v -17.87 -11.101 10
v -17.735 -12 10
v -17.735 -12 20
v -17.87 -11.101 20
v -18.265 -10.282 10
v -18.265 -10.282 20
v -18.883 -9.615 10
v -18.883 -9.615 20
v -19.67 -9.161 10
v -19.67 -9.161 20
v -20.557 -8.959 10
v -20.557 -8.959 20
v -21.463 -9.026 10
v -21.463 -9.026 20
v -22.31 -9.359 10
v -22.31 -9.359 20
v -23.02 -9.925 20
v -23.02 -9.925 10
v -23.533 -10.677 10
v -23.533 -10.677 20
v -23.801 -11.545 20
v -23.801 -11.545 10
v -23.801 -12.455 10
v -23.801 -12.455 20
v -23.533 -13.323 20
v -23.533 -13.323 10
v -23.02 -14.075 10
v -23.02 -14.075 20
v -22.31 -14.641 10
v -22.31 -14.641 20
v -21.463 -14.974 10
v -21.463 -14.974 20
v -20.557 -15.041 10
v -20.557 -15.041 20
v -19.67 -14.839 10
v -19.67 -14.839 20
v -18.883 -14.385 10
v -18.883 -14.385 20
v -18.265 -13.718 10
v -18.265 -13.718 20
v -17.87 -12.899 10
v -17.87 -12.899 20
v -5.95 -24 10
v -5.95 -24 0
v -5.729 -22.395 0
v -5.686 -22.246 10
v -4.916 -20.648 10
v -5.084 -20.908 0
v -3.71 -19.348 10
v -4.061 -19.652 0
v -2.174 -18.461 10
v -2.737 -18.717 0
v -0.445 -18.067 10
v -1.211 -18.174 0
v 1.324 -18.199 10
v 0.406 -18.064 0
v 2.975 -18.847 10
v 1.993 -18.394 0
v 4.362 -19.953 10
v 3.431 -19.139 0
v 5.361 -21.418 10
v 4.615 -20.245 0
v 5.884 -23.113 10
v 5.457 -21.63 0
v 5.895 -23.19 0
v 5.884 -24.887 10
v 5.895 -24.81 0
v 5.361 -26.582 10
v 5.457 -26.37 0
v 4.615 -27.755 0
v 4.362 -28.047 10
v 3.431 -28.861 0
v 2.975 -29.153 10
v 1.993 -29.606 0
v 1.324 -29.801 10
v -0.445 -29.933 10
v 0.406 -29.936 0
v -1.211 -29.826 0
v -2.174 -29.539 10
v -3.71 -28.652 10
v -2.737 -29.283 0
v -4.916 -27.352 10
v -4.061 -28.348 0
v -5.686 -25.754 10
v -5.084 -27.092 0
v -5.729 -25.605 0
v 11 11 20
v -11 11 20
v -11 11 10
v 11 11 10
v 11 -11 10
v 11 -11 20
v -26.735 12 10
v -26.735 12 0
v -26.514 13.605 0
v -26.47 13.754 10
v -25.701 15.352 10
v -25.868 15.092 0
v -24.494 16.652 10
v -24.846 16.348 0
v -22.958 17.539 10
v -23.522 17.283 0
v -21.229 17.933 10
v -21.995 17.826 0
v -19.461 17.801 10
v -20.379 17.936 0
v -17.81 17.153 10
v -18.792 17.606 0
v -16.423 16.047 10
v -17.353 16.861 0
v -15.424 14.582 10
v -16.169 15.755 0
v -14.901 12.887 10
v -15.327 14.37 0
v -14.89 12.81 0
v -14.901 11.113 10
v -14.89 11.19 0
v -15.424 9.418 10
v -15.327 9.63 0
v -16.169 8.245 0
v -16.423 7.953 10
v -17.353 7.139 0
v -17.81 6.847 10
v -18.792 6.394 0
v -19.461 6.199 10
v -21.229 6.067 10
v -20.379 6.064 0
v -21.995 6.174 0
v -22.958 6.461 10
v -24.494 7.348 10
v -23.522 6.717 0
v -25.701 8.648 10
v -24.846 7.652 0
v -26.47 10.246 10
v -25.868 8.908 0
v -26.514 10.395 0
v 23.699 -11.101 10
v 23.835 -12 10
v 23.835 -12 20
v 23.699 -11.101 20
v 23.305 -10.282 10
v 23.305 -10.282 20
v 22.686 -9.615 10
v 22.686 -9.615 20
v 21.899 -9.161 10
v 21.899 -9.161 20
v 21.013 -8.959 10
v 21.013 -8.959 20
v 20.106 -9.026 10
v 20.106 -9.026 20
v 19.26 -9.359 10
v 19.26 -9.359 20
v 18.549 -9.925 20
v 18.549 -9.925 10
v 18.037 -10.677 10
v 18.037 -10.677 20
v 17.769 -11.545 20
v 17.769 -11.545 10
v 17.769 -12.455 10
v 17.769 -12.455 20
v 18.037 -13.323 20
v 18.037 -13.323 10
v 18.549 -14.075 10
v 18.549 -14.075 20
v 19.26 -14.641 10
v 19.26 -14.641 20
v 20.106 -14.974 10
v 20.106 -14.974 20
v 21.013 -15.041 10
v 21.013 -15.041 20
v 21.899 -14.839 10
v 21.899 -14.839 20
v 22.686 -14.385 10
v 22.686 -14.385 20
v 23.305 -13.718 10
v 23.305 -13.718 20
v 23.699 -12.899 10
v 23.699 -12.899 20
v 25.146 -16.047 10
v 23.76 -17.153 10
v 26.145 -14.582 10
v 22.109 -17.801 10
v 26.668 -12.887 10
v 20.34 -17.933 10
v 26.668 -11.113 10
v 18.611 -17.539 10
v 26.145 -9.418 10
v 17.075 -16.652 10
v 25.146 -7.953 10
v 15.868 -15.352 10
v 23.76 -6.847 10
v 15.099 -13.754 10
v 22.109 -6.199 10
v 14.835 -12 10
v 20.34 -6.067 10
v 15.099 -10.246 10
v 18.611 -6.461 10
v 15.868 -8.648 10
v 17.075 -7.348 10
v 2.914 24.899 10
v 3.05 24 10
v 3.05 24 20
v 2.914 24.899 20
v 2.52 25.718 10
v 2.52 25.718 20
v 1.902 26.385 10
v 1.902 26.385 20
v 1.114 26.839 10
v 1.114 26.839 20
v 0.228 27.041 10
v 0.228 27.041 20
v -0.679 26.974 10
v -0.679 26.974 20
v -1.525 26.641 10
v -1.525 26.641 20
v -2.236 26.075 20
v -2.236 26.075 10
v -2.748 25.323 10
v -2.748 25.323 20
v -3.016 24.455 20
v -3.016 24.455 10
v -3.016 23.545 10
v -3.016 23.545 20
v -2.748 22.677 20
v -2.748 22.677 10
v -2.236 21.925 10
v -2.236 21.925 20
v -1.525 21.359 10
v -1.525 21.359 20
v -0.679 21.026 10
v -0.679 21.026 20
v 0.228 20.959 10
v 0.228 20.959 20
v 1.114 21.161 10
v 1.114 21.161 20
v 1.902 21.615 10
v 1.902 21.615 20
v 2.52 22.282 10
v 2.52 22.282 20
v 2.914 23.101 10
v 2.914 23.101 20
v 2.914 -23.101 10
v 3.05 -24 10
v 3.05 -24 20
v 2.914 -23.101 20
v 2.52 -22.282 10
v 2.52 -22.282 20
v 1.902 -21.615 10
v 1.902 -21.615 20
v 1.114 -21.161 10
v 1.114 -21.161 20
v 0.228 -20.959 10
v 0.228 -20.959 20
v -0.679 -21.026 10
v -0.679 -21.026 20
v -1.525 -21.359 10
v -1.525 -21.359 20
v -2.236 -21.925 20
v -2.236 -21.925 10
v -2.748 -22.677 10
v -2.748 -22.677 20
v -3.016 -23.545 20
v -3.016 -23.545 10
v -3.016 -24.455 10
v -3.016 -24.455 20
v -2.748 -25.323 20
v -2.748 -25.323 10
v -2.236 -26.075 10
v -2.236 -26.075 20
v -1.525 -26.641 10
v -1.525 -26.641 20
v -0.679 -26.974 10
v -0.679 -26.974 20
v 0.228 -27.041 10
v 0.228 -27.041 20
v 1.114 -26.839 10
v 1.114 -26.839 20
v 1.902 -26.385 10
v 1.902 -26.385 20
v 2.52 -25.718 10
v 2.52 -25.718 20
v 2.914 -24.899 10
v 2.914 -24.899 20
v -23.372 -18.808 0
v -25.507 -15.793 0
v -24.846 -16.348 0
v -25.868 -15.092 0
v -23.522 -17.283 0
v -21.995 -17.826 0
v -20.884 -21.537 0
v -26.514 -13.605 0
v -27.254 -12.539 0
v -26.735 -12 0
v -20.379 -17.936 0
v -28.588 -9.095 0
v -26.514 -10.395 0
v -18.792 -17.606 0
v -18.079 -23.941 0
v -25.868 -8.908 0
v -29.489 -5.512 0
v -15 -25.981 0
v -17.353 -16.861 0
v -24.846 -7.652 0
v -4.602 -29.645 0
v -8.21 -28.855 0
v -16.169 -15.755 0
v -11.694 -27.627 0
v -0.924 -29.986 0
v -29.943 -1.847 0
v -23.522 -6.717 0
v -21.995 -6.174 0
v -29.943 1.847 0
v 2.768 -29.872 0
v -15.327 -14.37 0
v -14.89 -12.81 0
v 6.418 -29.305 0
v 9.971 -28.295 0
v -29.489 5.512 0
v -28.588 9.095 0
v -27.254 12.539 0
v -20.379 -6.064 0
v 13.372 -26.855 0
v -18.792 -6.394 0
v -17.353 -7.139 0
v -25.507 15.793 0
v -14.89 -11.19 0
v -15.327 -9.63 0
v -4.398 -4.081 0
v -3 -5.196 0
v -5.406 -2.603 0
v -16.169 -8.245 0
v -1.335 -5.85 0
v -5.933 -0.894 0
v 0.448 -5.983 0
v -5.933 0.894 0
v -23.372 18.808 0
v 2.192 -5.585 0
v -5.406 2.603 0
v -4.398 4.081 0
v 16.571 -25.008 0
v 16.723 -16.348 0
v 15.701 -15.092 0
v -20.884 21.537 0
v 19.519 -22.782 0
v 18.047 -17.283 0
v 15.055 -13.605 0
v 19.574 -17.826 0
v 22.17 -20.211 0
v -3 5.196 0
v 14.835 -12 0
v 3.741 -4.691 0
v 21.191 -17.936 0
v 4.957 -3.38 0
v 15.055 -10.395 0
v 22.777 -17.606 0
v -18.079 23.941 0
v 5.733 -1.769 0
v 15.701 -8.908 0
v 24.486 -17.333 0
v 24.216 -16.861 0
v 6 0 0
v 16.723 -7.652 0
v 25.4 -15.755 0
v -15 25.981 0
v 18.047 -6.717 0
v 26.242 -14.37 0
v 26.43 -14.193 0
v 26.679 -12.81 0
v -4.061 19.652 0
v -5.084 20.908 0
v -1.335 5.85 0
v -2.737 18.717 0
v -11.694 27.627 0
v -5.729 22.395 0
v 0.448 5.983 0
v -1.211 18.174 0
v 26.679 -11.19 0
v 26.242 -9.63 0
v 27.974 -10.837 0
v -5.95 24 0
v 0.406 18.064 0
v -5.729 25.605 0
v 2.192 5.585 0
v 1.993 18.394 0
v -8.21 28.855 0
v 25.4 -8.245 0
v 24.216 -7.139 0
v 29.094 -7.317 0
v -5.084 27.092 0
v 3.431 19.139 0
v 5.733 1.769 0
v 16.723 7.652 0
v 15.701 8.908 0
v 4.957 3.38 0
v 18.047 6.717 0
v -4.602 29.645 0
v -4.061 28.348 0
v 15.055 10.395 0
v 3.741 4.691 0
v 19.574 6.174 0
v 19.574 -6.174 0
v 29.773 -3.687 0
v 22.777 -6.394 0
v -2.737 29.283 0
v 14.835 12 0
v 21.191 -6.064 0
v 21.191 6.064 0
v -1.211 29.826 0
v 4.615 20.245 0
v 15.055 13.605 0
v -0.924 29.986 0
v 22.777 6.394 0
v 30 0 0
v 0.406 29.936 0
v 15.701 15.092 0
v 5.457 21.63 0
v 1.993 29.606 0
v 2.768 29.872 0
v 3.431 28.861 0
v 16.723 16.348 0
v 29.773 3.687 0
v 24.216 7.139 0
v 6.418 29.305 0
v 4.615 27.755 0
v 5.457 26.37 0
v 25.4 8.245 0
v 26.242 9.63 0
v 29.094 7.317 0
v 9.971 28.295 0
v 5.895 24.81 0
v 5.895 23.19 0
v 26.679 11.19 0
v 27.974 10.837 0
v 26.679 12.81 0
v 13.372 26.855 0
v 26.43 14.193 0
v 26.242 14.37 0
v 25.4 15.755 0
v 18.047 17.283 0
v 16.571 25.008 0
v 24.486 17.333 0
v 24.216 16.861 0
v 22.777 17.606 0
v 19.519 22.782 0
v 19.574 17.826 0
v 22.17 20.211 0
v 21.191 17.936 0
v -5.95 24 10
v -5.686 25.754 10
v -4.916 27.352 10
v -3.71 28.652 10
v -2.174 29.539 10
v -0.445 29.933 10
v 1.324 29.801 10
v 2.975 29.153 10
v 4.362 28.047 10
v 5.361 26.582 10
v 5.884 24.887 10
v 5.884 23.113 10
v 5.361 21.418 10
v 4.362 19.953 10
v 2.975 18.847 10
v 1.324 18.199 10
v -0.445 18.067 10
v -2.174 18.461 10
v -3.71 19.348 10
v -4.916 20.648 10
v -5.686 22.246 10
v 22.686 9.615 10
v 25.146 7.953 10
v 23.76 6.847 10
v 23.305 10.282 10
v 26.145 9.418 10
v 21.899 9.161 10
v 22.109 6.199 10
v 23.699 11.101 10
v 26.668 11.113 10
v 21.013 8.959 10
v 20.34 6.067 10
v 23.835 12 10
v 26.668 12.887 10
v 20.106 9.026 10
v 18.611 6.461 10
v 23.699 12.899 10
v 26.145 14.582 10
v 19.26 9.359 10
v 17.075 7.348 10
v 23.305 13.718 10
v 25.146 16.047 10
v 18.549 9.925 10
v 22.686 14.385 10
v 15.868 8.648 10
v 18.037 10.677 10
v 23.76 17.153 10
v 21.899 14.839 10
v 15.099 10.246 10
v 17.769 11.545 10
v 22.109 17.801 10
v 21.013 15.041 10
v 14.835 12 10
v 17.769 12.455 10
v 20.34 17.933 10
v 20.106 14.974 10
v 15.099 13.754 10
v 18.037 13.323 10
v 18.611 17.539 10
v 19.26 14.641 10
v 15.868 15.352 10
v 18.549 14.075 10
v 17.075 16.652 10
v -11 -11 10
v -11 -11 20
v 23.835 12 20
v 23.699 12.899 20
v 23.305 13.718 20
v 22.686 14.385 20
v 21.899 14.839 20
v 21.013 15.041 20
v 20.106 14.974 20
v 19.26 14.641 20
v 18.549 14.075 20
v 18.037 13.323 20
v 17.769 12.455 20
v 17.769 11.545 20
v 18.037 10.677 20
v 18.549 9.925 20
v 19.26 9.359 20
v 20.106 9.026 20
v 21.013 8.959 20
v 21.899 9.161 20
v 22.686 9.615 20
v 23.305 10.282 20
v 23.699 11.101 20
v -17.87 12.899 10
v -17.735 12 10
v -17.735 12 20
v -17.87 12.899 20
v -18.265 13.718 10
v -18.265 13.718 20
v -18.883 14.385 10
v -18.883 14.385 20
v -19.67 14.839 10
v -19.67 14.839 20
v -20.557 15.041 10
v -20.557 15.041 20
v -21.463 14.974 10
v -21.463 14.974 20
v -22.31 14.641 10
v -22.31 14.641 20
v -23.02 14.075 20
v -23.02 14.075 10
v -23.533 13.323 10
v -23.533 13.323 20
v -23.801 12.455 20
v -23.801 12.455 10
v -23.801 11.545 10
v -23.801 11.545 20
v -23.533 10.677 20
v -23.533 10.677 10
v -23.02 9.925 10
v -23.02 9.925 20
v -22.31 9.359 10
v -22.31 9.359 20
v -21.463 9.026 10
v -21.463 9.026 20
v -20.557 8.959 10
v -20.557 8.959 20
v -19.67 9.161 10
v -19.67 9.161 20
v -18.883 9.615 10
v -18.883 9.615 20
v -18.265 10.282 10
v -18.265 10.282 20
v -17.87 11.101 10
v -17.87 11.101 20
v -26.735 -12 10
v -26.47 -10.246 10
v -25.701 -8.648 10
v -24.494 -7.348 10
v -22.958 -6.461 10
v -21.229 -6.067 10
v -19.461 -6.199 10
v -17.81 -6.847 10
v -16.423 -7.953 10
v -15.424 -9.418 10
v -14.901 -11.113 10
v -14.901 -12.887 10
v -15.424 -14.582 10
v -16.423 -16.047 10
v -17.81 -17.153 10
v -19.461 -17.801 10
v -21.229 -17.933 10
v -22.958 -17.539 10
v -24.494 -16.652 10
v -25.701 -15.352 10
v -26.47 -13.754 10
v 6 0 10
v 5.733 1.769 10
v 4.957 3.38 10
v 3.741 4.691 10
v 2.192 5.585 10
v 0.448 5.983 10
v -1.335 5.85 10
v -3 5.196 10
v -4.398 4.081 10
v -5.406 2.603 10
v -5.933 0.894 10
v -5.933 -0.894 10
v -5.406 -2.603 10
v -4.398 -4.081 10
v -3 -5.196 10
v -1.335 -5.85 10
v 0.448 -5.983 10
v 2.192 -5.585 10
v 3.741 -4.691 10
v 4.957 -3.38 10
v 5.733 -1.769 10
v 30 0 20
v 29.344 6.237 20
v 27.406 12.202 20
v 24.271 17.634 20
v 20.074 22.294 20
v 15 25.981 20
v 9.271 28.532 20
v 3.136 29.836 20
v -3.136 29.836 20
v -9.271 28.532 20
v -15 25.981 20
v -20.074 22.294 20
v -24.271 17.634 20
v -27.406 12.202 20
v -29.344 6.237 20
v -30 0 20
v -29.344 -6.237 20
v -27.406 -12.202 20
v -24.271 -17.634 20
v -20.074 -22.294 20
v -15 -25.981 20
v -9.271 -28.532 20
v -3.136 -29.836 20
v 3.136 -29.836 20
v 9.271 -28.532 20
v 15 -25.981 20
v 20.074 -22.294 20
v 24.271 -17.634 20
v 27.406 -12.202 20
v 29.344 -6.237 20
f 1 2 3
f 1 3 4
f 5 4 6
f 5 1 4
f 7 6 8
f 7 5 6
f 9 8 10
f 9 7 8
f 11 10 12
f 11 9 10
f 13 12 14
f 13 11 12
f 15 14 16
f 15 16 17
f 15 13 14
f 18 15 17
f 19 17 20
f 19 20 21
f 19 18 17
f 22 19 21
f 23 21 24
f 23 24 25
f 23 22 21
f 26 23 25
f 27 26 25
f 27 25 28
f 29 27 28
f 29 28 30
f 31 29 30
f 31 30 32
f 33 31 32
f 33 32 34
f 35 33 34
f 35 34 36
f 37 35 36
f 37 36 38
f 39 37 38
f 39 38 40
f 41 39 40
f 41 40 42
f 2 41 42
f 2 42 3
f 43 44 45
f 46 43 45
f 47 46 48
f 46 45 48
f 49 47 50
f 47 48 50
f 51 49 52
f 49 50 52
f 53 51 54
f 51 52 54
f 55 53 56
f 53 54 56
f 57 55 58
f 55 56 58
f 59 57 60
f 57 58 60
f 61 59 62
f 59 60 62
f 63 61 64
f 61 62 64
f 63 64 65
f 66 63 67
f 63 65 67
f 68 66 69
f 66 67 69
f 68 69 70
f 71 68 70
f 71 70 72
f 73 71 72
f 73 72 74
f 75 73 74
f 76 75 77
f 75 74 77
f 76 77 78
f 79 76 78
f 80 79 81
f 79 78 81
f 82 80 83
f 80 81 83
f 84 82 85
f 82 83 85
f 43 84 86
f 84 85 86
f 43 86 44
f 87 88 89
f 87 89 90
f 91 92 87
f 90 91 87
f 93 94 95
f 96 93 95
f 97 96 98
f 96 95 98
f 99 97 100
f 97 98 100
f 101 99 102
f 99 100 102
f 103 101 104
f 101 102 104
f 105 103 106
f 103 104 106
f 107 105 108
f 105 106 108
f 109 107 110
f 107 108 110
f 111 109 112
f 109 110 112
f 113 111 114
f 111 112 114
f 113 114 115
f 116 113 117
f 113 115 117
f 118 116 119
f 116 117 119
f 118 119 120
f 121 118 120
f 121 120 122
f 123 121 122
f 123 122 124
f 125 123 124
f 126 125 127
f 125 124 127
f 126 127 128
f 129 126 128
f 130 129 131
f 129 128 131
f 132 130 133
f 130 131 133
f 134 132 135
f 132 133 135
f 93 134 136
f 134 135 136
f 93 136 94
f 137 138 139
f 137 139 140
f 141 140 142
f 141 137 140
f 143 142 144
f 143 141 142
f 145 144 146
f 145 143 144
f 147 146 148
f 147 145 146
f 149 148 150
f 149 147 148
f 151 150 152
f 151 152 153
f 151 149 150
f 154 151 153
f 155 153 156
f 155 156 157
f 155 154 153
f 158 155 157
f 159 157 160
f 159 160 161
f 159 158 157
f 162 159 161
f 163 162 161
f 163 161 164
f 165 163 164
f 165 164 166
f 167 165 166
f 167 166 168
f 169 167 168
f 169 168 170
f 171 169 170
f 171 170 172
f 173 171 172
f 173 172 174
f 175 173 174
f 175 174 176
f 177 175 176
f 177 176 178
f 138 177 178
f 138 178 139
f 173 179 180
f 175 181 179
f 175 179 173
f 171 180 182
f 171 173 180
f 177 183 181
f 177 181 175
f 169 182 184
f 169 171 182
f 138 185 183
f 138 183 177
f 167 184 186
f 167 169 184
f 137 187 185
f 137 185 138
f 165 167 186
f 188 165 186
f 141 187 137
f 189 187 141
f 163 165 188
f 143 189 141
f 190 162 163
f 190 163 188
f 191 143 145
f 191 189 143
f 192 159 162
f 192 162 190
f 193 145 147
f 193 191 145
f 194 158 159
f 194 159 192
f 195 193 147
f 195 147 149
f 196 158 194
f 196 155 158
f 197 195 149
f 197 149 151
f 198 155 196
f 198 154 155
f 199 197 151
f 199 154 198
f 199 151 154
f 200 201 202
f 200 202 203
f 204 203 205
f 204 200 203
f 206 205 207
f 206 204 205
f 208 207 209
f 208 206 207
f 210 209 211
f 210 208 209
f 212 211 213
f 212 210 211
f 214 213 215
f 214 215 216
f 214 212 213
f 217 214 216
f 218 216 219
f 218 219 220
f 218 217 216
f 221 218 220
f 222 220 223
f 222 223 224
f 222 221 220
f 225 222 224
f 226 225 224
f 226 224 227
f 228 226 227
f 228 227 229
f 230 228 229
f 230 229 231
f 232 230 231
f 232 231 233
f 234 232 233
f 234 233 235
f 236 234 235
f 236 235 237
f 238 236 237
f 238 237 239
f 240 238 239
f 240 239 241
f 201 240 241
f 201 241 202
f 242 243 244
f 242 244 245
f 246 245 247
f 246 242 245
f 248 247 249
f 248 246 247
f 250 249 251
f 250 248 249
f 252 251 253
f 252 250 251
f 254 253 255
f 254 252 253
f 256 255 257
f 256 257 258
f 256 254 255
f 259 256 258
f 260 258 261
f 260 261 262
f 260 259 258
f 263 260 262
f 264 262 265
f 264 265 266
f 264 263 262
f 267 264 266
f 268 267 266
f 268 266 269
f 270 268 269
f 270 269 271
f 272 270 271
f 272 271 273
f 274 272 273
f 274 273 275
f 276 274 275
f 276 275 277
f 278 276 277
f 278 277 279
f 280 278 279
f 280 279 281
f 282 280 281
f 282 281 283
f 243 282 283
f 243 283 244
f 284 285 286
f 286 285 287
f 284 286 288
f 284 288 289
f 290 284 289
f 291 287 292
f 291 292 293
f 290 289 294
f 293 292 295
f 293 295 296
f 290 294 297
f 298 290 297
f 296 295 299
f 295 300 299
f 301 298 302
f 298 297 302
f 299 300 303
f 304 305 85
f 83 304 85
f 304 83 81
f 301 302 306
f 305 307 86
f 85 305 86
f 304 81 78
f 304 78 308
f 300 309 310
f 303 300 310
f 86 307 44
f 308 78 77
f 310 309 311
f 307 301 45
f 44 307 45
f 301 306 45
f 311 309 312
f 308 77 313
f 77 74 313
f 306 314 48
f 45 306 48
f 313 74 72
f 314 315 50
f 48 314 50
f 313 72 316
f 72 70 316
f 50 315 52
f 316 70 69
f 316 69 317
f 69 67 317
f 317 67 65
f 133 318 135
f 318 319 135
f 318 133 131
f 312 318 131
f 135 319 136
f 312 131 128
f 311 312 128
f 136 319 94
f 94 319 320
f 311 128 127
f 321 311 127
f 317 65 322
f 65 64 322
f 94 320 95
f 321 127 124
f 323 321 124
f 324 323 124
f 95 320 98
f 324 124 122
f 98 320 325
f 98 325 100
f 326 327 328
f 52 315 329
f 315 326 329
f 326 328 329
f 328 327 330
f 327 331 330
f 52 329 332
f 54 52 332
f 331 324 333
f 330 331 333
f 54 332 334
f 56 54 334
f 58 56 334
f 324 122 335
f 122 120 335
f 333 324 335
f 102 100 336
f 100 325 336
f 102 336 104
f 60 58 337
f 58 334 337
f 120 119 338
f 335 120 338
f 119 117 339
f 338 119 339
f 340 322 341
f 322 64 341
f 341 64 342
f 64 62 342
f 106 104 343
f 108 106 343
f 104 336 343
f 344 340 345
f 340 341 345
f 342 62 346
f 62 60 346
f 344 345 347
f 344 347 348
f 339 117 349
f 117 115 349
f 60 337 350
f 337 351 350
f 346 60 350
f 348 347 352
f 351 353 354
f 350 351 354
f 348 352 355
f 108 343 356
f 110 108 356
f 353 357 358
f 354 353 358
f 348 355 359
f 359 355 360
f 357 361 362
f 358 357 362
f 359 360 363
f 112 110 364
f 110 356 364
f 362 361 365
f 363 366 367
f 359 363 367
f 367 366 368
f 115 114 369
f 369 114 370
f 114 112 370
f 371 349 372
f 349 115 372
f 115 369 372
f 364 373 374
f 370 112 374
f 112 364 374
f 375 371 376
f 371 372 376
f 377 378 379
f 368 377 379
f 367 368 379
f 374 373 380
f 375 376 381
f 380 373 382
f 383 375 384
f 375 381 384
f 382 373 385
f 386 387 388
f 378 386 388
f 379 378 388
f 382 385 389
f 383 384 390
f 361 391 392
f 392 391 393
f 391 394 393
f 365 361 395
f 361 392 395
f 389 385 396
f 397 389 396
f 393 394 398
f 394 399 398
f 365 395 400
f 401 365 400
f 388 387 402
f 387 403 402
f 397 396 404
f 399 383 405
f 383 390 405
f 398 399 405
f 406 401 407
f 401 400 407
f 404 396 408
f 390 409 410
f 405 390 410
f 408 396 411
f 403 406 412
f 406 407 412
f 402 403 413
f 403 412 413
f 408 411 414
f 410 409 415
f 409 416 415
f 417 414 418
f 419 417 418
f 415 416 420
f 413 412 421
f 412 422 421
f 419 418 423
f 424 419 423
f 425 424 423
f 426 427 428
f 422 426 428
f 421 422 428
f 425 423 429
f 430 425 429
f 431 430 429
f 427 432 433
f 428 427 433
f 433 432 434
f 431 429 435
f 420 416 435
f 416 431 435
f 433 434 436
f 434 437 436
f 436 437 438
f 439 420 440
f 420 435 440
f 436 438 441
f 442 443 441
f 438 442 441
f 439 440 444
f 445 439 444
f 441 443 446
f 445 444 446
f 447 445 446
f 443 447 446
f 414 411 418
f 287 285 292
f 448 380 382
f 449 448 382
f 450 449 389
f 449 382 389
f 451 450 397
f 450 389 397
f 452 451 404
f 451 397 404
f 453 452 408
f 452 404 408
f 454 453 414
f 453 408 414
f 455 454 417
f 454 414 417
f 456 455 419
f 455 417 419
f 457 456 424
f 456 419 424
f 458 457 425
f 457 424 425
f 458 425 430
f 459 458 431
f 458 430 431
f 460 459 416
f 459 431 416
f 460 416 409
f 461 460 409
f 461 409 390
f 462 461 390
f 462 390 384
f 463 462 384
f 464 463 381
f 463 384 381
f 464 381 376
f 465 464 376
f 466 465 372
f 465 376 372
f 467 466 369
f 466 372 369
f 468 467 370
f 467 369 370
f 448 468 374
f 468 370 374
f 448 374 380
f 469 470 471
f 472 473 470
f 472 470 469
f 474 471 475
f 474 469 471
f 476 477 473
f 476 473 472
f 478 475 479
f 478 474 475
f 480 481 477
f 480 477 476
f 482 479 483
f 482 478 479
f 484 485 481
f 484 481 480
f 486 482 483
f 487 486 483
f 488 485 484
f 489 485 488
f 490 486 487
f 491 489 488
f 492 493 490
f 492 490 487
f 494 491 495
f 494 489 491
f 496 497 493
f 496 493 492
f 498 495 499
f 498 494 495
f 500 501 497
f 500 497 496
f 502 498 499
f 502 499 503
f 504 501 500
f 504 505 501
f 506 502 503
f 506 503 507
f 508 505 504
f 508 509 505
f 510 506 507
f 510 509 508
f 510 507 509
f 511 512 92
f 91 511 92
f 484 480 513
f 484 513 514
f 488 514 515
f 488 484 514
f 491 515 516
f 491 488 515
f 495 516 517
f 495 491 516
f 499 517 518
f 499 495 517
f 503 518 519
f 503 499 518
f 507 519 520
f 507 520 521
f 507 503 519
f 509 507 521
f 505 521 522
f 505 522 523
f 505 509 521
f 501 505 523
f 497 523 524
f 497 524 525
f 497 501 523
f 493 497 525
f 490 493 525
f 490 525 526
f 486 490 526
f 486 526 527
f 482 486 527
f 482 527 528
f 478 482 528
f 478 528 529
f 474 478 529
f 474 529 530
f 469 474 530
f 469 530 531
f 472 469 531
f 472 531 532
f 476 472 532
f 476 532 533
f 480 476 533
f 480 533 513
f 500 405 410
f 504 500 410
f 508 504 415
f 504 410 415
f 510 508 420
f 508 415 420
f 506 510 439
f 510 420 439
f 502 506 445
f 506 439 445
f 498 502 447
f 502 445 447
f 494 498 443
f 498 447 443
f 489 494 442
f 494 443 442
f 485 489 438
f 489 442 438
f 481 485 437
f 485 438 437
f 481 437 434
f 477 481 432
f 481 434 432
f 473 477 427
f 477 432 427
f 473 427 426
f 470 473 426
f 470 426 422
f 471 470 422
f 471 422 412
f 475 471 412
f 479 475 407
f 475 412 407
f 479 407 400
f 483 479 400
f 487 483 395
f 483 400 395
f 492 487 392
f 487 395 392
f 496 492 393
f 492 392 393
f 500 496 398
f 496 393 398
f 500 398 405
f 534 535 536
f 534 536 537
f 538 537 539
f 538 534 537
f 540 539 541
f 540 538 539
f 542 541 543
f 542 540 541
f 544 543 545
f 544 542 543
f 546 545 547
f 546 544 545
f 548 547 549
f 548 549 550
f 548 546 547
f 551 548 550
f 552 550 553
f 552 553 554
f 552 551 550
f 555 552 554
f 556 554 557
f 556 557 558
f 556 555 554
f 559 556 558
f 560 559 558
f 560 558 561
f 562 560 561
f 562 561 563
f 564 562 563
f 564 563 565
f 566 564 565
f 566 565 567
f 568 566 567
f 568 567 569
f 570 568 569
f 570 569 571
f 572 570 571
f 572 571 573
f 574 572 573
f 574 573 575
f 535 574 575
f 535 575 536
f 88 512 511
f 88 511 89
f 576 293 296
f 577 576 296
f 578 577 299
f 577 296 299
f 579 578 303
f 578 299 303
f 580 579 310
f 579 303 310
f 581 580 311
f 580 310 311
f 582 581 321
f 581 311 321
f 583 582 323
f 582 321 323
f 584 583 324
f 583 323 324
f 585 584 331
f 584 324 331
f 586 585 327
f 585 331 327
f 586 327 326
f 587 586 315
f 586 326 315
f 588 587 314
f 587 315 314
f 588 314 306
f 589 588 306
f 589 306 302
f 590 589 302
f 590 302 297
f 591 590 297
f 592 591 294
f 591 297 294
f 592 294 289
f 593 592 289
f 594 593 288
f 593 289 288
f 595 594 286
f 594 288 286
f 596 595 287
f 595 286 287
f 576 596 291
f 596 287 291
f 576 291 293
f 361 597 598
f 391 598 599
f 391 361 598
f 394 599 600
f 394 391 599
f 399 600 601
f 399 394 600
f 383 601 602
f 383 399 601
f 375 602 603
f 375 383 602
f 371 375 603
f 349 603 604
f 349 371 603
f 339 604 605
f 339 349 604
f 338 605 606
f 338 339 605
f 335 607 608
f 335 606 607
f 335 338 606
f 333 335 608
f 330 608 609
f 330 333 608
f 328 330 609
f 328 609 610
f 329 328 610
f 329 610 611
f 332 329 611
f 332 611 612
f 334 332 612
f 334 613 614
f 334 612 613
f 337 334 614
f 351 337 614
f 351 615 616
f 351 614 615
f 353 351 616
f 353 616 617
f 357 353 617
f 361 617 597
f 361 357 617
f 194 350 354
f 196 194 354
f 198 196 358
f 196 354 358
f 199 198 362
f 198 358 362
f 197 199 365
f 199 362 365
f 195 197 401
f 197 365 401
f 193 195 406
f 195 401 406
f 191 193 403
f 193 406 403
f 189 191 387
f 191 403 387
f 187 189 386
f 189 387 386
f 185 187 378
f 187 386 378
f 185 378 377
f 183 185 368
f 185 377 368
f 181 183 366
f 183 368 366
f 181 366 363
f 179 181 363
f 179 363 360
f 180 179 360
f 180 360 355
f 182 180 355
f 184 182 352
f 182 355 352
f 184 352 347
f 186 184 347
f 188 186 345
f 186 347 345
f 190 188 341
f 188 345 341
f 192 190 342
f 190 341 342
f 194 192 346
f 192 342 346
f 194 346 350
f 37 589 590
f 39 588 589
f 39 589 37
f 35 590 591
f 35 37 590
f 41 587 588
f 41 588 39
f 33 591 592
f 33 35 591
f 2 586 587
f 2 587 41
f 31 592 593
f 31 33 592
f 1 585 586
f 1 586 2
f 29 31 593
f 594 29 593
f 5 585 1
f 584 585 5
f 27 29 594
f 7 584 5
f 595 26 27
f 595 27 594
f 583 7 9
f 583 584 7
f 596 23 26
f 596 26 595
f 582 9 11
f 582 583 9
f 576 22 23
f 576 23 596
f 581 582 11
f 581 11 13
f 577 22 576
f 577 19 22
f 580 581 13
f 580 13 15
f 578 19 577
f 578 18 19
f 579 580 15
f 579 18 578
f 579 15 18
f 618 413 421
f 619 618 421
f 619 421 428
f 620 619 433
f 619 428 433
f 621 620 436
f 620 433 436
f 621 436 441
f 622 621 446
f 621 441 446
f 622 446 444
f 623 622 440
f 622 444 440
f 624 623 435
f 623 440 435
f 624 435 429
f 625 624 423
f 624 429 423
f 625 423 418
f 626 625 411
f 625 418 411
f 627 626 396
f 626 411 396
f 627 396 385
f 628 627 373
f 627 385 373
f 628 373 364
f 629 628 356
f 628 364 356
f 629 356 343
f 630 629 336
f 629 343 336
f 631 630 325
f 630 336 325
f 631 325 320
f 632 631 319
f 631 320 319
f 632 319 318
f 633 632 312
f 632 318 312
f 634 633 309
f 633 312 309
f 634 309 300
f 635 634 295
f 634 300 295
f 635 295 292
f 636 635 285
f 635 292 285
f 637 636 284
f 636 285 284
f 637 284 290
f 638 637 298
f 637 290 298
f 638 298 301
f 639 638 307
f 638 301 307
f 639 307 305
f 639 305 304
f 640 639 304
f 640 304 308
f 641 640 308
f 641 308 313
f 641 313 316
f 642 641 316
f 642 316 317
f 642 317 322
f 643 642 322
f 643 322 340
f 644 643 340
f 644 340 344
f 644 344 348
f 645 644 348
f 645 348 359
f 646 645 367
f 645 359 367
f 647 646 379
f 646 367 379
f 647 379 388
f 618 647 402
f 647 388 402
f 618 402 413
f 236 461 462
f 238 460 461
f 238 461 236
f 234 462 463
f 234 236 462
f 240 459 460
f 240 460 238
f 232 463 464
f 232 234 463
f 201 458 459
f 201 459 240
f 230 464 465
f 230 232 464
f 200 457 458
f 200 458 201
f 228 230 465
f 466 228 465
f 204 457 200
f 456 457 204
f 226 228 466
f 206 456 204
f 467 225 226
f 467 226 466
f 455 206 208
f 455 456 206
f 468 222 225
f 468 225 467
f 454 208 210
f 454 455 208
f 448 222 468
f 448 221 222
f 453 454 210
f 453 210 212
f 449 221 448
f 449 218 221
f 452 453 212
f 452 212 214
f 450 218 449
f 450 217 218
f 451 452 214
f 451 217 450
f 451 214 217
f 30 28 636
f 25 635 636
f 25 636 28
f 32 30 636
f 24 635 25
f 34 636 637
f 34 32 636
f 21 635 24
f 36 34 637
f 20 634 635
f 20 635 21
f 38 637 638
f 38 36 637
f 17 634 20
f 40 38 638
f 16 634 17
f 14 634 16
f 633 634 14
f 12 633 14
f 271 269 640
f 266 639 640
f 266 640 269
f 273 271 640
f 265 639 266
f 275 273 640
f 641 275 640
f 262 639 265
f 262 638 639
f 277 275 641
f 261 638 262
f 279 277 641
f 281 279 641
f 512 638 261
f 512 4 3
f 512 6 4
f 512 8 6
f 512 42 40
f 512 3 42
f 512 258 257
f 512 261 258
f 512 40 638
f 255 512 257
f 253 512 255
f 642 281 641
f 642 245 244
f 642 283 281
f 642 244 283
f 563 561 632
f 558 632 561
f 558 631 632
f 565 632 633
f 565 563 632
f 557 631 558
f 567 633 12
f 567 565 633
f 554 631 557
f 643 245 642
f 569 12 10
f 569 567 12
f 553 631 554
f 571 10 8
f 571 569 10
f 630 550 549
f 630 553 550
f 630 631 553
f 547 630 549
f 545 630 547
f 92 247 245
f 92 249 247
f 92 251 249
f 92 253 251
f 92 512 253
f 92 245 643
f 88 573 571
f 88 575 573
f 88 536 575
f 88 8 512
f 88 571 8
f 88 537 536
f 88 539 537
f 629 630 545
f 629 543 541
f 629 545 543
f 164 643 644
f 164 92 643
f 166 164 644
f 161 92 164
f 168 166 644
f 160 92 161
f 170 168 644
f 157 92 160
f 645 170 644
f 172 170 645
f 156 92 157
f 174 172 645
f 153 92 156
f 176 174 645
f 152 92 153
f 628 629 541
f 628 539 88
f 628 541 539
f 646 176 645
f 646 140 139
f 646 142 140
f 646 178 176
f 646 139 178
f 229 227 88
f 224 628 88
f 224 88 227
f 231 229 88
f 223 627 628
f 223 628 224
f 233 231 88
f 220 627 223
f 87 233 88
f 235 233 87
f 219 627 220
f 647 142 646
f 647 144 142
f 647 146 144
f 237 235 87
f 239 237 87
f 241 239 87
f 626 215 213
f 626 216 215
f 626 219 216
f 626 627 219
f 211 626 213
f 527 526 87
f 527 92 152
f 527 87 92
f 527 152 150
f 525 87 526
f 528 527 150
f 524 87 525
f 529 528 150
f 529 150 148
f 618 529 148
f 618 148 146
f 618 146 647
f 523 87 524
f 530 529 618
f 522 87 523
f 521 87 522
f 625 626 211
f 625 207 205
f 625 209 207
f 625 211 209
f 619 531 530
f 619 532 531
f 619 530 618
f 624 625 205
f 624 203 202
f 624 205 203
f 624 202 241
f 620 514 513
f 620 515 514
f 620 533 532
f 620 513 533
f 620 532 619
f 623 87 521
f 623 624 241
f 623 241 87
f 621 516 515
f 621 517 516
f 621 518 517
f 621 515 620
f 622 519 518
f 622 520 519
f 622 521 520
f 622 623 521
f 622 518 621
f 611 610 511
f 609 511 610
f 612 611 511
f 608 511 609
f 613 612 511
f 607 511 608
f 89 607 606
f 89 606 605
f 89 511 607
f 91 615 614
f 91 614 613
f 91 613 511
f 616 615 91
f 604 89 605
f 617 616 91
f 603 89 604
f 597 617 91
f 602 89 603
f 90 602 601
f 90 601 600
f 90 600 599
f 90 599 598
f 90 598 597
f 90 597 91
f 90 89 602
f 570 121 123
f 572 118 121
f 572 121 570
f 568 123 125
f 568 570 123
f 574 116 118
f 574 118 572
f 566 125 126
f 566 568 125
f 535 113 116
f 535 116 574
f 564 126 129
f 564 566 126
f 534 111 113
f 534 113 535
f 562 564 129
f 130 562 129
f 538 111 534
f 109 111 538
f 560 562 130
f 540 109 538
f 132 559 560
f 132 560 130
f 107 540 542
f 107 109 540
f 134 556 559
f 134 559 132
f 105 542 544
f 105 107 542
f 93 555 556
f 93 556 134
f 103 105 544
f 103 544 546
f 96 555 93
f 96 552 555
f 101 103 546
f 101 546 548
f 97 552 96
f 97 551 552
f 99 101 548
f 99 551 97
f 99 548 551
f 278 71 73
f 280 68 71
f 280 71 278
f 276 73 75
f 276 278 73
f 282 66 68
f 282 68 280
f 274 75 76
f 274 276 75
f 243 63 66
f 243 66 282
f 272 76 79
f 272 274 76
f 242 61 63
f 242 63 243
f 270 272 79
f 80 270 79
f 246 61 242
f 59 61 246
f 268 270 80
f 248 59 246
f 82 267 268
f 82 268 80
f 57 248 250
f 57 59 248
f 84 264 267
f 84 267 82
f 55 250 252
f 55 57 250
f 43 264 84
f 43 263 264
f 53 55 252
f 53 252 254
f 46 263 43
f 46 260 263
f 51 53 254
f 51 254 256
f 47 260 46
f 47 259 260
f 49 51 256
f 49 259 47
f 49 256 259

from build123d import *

# Parameters (mm, degrees)
SKETCH_1_R          = 30
SKETCH_1_R_2        = 3.05
SKETCH_1_R_3        = 6
EXTRUDE_1_DEPTH     = 20
SKETCH_2_W          = 22
SKETCH_2_H          = 22
CUT_EXTRUDE_1_DEPTH = 10
SKETCH_3_R          = 5.95
CUT_EXTRUDE_6_DEPTH = 10


with BuildPart() as part:
    # Эскиз1 → Бобышка-Вытянуть1 (new body)
    with BuildSketch(Plane.XY):
        Circle(SKETCH_1_R)
        with Locations((0, 24)):
            Circle(SKETCH_1_R_2, mode=Mode.SUBTRACT)
        with Locations((20.784609691, 12)):
            Circle(SKETCH_1_R_2, mode=Mode.SUBTRACT)
        with Locations((20.784609691, -12)):
            Circle(SKETCH_1_R_2, mode=Mode.SUBTRACT)
        with Locations((0, -24)):
            Circle(SKETCH_1_R_2, mode=Mode.SUBTRACT)
        with Locations((-20.784609691, -12)):
            Circle(SKETCH_1_R_2, mode=Mode.SUBTRACT)
        with Locations((-20.784609691, 12)):
            Circle(SKETCH_1_R_2, mode=Mode.SUBTRACT)
        Circle(SKETCH_1_R_3, mode=Mode.SUBTRACT)
    extrude(amount=EXTRUDE_1_DEPTH)

    # Эскиз2 → Вырез-Вытянуть1 (cut)
    with BuildSketch(Plane.XY.offset(20)):
        Rectangle(SKETCH_2_W, SKETCH_2_H)
    extrude(amount=-CUT_EXTRUDE_1_DEPTH, mode=Mode.SUBTRACT)

    # Эскиз3 → Вырез-Вытянуть6 (cut)
    with BuildSketch(Plane(origin=(0, 0, 0), x_dir=(-1, 0, 0), z_dir=(0, 0, -1))):
        with Locations((0, 24)):
            Circle(SKETCH_3_R)
        with Locations((20.784609691, 12)):
            Circle(SKETCH_3_R)
        with Locations((20.784609691, -12)):
            Circle(SKETCH_3_R)
        with Locations((0, -24)):
            Circle(SKETCH_3_R)
        with Locations((-20.784609691, -12)):
            Circle(SKETCH_3_R)
        with Locations((-20.784609691, 12)):
            Circle(SKETCH_3_R)
    extrude(amount=-CUT_EXTRUDE_6_DEPTH, mode=Mode.SUBTRACT)


solid = part.part
